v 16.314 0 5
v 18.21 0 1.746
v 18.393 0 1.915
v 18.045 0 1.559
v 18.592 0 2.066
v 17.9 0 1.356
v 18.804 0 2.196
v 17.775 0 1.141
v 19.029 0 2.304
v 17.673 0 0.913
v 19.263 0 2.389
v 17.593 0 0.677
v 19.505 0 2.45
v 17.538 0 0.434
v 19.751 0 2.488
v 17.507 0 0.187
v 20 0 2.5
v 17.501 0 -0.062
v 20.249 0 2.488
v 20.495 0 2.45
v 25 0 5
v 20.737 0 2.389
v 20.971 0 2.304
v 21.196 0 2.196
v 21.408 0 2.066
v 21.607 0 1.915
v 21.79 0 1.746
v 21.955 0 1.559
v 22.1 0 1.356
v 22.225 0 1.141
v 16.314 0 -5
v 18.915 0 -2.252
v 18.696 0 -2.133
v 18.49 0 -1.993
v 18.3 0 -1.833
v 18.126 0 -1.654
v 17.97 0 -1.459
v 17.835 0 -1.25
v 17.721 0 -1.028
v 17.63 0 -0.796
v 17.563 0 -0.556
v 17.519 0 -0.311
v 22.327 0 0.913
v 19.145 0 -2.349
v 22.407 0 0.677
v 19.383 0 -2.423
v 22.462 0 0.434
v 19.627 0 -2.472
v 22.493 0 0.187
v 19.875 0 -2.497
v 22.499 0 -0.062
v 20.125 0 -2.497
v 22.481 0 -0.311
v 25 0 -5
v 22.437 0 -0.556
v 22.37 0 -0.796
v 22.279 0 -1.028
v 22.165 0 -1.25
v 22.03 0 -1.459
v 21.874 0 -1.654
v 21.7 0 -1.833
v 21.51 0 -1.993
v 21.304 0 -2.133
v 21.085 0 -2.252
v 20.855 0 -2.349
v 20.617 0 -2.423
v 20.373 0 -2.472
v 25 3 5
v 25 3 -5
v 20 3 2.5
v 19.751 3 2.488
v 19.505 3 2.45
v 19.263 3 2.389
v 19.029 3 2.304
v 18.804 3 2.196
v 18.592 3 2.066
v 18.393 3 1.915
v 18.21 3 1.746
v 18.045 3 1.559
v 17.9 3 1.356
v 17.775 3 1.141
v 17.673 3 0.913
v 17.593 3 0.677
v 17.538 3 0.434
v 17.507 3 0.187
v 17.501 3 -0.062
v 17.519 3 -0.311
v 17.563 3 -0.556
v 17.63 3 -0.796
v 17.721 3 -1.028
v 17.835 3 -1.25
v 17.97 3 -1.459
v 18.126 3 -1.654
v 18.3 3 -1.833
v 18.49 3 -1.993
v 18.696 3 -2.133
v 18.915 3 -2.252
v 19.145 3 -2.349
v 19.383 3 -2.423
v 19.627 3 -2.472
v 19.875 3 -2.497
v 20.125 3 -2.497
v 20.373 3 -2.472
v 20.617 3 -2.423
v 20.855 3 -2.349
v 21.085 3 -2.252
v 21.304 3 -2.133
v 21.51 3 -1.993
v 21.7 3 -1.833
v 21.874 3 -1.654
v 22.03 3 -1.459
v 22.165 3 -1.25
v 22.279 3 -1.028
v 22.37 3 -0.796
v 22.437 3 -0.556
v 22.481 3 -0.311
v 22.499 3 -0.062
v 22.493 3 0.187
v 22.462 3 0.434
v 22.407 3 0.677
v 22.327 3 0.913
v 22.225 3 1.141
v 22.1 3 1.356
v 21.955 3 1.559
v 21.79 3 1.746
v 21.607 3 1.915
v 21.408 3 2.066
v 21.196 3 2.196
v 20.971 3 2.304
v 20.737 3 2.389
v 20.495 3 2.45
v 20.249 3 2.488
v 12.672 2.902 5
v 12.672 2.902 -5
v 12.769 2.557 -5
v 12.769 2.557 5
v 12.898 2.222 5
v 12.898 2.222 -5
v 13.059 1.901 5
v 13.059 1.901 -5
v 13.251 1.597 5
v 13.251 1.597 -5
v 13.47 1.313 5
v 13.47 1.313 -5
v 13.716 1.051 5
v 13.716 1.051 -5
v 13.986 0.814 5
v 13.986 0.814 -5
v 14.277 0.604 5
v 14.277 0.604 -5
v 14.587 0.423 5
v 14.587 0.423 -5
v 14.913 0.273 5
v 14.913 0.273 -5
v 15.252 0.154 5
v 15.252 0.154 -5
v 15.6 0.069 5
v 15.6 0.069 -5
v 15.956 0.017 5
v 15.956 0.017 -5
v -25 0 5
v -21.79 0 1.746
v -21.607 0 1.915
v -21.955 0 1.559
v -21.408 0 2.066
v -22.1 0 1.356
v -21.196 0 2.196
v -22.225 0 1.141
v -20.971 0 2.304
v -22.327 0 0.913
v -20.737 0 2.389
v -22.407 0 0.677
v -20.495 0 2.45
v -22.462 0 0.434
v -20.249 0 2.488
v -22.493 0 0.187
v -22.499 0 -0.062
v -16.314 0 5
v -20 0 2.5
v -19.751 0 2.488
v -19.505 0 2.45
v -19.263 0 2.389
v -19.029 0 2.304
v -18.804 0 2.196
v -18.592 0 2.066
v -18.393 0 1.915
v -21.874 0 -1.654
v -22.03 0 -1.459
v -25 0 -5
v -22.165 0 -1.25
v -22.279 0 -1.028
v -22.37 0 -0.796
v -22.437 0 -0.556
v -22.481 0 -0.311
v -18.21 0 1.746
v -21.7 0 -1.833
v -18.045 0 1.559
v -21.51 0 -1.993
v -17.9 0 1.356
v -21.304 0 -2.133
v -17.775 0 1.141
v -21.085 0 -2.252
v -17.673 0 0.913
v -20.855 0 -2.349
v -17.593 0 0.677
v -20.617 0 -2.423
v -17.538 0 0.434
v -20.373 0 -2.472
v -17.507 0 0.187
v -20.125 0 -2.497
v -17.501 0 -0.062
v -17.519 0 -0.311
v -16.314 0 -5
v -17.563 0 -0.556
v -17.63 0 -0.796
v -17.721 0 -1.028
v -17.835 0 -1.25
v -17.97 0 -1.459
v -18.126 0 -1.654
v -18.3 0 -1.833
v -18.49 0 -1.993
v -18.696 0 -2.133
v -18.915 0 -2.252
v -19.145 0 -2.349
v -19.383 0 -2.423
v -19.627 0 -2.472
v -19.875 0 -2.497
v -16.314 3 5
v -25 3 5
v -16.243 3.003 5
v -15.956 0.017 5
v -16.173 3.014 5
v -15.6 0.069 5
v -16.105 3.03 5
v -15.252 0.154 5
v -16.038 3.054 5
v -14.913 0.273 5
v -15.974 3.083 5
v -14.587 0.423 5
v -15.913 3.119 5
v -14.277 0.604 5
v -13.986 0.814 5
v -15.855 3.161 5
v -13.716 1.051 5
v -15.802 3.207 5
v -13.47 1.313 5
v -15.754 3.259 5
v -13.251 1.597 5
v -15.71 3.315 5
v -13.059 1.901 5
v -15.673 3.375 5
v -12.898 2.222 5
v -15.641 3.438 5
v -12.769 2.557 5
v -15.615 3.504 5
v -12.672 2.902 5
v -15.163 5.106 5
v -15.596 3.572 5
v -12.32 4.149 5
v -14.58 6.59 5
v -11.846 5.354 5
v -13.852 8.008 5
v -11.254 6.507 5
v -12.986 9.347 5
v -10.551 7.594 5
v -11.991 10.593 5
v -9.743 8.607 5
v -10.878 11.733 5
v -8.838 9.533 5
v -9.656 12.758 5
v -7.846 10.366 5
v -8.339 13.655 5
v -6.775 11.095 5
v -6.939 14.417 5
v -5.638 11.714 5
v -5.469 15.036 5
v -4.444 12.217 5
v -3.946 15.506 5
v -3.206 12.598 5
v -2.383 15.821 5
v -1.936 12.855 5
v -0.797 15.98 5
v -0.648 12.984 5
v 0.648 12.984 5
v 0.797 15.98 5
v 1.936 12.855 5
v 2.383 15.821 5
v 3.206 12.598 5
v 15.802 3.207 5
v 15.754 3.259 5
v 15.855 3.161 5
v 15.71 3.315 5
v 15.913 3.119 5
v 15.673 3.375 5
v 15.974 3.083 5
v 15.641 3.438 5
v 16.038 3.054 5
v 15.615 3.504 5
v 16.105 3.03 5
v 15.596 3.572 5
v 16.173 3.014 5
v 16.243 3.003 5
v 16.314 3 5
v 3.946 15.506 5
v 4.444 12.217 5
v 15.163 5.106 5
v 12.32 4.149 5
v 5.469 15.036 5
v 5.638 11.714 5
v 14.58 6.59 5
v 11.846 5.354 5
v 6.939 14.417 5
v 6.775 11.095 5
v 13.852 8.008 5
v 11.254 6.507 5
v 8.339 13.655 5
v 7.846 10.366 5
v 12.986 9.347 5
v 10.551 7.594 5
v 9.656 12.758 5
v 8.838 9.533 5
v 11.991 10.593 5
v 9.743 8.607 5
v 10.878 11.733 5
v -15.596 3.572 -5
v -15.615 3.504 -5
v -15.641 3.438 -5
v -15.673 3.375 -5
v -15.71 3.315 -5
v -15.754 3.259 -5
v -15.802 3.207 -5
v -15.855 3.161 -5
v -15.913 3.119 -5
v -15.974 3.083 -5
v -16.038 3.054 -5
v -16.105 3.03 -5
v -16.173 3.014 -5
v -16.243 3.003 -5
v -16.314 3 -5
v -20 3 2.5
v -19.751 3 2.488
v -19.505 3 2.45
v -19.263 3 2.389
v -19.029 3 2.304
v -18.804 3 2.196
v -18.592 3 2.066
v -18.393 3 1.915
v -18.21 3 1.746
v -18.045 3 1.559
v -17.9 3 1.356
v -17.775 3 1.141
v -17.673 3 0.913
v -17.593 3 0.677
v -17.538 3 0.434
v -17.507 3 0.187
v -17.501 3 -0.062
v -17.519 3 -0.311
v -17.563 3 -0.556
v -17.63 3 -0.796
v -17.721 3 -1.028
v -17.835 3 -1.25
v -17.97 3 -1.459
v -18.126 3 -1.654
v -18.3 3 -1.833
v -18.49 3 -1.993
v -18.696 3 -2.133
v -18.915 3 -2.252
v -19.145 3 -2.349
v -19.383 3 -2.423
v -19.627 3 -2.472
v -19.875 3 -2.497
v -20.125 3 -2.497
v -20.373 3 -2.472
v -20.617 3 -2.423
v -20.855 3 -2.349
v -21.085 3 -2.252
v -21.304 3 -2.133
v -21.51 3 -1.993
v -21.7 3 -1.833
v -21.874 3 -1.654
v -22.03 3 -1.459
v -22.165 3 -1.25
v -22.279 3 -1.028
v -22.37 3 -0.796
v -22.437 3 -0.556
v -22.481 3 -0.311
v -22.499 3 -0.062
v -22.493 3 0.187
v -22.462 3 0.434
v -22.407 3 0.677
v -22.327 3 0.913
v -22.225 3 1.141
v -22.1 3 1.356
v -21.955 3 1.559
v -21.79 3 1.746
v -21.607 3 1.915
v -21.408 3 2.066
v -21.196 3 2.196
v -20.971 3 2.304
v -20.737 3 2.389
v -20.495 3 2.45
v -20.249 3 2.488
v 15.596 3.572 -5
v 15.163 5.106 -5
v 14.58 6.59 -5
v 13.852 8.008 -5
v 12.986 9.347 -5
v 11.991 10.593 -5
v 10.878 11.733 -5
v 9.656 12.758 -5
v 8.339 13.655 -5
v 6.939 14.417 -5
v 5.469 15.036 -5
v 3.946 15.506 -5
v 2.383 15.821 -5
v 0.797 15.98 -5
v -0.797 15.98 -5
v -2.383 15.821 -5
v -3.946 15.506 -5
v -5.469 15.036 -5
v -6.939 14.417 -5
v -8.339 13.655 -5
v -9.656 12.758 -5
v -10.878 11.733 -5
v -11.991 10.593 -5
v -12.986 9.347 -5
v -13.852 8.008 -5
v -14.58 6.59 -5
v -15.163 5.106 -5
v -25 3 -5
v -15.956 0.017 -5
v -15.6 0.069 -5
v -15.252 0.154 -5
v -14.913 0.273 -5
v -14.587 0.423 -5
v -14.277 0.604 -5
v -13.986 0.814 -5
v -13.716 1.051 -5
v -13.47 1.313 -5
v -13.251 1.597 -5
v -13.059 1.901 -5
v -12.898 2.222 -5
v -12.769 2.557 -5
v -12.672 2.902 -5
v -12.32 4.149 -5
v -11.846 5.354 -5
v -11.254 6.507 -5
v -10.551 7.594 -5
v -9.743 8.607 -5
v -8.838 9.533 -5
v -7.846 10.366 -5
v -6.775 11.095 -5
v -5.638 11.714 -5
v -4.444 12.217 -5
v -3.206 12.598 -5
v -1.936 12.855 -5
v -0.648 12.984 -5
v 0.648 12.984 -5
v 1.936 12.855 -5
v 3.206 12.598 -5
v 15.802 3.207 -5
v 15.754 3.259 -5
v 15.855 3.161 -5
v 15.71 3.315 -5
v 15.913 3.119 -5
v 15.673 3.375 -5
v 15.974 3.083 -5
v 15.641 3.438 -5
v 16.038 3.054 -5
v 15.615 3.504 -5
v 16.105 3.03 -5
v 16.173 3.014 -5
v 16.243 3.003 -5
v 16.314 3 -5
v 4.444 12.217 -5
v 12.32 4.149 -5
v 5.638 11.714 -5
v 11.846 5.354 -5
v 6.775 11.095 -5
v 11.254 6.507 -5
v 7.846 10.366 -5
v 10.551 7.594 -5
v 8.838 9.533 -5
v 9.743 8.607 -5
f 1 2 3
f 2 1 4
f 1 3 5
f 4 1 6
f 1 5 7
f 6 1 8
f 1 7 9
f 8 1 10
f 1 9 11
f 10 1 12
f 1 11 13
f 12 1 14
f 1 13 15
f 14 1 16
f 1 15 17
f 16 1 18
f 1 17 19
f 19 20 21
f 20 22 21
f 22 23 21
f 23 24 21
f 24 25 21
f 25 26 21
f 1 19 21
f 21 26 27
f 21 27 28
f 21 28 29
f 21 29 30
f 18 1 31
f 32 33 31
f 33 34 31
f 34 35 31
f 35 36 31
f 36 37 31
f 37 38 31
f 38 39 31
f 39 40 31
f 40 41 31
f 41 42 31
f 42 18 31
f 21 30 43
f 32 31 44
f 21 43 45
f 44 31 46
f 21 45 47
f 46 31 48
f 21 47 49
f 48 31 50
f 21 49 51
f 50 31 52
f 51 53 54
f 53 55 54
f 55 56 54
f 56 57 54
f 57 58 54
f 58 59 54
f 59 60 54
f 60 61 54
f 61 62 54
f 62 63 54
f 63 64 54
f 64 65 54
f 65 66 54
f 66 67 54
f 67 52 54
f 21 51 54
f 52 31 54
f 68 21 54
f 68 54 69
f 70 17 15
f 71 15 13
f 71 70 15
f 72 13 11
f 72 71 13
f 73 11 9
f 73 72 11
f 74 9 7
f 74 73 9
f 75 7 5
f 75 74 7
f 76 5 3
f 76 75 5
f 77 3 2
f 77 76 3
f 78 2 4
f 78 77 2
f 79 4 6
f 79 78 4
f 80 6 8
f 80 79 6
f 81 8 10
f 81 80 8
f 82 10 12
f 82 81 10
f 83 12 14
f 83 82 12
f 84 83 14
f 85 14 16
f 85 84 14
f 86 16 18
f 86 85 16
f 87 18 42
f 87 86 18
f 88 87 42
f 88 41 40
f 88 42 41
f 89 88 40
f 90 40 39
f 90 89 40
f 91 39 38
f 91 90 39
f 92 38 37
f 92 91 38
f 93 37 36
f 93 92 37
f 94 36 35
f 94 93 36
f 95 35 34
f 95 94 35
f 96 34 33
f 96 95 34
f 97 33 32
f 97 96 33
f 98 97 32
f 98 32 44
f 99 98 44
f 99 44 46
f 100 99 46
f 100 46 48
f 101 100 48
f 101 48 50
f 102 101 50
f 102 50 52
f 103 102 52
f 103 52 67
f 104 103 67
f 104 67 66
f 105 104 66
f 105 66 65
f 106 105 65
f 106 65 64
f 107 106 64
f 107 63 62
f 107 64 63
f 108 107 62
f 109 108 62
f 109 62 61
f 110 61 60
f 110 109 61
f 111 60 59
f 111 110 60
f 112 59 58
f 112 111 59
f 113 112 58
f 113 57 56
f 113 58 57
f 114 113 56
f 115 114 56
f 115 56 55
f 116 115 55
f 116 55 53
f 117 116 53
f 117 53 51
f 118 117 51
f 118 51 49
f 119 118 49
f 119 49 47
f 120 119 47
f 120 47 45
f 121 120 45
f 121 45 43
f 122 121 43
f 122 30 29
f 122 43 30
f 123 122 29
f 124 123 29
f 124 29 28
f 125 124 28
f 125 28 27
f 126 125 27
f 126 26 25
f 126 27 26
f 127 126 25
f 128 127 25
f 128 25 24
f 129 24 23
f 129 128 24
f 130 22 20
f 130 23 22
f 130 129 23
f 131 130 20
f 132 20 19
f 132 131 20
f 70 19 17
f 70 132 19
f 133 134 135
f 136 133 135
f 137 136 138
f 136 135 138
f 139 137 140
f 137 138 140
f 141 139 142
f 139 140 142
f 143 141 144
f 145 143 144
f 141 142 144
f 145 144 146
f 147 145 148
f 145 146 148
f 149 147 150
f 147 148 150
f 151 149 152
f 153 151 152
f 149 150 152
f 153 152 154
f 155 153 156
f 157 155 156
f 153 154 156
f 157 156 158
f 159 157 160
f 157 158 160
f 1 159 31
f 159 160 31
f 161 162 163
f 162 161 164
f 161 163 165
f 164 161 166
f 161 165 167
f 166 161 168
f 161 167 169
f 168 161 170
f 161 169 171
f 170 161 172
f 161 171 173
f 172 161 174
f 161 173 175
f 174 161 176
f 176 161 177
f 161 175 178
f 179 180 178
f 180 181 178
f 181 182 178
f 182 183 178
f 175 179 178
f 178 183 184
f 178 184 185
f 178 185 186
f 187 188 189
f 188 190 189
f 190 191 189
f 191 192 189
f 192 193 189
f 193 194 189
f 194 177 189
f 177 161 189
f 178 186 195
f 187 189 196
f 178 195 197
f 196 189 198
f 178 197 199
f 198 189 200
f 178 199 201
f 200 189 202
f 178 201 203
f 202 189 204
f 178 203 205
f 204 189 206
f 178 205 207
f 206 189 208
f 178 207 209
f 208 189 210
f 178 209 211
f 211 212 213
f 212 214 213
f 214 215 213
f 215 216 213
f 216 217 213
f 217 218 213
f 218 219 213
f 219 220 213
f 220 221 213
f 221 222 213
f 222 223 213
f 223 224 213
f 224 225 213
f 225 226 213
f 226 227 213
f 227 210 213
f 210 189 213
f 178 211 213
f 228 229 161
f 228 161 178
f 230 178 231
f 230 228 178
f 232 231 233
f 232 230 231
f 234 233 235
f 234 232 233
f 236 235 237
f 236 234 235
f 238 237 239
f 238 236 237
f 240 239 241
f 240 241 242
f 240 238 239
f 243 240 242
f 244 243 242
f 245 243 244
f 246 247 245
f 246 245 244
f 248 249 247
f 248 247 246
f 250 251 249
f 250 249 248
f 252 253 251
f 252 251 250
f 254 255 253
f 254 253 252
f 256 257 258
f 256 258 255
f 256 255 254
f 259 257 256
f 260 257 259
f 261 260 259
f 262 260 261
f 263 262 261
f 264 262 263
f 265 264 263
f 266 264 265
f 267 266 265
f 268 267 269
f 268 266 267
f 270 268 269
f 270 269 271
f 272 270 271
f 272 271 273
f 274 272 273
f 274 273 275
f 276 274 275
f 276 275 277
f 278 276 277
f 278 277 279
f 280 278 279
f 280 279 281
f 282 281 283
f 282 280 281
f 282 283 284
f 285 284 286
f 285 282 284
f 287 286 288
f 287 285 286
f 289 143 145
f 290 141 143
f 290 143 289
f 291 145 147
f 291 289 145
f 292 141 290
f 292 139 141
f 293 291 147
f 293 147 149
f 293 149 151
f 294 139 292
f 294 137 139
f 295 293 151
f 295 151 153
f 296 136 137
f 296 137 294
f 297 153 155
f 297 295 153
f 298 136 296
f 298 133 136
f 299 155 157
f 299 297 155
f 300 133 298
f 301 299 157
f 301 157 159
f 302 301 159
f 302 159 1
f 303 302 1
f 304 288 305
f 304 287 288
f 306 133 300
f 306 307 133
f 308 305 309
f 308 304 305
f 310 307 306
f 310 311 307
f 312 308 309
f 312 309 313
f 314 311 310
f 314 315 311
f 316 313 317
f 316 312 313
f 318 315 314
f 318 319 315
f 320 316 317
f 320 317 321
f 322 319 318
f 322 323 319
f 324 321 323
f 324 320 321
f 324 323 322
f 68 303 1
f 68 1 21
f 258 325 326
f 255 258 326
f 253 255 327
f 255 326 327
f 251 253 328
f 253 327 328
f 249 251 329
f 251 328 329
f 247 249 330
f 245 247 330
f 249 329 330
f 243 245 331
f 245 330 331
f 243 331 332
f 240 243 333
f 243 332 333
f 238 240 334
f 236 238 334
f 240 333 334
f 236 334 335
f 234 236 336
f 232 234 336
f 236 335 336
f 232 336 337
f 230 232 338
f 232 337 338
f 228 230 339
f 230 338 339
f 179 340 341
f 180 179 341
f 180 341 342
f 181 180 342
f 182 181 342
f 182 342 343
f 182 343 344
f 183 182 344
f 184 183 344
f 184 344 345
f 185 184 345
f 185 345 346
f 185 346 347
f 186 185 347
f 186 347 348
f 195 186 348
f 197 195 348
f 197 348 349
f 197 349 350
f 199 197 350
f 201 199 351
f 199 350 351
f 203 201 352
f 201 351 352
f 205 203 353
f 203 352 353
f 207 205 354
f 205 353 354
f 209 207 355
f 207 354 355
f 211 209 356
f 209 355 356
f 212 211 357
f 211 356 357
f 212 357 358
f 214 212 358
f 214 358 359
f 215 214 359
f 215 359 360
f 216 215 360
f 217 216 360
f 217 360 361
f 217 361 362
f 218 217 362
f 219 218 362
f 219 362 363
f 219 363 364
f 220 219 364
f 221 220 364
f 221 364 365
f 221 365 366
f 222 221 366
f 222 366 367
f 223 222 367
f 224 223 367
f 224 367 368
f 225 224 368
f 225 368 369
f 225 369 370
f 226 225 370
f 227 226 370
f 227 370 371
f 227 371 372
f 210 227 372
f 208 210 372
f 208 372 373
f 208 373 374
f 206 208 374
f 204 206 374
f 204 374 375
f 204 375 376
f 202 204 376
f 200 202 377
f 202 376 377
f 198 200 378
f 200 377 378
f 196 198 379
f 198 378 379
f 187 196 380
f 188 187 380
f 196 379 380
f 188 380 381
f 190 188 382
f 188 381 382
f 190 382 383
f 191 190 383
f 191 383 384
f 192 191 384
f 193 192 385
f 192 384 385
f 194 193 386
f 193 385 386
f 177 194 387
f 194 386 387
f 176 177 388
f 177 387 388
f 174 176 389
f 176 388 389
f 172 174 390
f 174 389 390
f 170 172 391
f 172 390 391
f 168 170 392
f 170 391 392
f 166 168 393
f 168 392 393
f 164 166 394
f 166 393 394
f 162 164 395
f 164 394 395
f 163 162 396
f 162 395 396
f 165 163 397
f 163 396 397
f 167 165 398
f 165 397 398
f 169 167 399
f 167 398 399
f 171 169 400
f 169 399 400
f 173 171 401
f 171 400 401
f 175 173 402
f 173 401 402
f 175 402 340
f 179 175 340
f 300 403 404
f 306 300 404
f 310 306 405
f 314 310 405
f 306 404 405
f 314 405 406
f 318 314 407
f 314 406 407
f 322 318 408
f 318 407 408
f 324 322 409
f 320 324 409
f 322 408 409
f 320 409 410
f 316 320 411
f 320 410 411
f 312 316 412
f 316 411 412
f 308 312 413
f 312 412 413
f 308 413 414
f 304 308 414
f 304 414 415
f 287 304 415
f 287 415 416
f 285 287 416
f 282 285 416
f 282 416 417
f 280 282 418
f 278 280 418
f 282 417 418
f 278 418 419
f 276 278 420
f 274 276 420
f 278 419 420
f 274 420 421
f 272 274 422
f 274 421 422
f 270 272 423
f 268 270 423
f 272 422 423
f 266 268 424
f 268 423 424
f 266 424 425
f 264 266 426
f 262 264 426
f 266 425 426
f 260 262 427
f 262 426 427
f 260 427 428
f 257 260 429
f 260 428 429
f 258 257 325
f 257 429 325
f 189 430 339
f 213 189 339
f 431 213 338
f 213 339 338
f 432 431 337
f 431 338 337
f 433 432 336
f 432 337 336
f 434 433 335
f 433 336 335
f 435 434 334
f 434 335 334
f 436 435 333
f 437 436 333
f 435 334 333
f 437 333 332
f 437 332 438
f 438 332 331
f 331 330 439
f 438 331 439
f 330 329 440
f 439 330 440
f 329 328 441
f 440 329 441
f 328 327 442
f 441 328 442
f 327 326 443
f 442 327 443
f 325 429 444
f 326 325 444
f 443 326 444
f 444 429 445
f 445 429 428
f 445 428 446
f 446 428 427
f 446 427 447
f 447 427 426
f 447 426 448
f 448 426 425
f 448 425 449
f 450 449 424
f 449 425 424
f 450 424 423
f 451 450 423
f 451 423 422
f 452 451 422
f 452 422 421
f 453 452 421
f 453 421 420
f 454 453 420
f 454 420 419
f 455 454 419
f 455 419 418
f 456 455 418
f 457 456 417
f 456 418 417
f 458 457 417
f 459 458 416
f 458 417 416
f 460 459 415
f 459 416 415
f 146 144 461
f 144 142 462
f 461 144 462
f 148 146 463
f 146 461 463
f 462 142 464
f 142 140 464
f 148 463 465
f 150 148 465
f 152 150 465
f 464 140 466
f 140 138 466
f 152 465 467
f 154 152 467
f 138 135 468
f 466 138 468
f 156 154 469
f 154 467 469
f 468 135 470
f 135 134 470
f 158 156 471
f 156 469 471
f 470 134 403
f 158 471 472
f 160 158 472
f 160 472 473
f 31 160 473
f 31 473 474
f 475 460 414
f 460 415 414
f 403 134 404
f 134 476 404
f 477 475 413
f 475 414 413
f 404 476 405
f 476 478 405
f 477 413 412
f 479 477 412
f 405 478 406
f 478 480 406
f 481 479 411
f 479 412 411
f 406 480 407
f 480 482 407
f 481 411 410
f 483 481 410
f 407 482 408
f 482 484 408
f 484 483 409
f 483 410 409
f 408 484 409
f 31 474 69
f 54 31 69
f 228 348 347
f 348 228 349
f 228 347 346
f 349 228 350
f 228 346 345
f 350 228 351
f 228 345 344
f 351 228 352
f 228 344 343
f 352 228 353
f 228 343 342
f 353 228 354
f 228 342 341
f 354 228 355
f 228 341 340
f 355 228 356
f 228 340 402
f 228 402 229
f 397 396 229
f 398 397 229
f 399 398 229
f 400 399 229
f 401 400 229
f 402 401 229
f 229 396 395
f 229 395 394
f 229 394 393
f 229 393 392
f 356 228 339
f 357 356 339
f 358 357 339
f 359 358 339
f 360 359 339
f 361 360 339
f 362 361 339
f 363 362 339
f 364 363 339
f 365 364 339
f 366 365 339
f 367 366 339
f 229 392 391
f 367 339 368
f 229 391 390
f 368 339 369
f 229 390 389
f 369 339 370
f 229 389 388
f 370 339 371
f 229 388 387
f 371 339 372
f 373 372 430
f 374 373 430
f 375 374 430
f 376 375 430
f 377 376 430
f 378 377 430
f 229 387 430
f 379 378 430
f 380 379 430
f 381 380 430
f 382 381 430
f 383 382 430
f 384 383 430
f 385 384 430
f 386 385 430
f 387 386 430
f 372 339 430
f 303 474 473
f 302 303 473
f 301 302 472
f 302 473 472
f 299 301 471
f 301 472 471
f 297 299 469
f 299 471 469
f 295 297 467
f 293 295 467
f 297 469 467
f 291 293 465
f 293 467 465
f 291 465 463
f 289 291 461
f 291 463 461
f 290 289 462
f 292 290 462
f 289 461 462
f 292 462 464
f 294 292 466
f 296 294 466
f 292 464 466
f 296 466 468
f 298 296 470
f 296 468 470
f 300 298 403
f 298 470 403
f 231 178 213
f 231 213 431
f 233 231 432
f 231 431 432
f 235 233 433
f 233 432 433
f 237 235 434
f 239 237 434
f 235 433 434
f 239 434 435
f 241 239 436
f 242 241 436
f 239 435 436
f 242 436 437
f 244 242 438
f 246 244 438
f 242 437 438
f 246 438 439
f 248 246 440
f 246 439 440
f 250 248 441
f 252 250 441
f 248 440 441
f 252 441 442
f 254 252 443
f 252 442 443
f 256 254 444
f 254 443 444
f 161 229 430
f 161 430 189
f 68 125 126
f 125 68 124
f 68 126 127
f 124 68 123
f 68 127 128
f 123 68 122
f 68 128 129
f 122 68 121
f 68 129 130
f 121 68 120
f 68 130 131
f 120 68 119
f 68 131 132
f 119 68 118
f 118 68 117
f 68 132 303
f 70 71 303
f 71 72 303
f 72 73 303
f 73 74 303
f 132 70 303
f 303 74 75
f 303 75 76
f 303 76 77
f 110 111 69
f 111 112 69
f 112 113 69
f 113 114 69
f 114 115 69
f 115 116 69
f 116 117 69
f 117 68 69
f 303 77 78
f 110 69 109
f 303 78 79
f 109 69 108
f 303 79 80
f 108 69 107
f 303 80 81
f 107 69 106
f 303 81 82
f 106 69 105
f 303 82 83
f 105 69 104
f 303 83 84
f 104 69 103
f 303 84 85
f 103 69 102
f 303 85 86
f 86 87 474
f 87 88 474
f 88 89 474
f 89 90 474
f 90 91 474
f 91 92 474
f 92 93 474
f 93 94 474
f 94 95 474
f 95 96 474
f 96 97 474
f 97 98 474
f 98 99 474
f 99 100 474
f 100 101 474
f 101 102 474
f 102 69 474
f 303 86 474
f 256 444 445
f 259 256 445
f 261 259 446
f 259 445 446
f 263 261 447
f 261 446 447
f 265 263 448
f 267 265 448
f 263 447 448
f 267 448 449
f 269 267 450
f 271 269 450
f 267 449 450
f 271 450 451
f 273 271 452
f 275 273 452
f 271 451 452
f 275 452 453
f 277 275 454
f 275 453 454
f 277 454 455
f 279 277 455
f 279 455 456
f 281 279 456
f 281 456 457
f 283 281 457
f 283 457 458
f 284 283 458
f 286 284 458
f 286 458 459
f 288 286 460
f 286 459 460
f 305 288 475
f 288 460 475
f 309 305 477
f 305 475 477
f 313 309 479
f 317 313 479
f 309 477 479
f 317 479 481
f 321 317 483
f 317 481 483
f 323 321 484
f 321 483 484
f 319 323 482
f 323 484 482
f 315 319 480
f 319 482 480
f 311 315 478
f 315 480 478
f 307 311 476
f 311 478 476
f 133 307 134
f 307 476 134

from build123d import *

# Parameters (mm, degrees)
BASE_FLANGE1_START = -5
BASE_FLANGE1_DEPTH = 10
SKETCH6_R          = 2.5
CUT_EXTRUDE1_DEPTH = 10


# Read off the part's stored shape, not the designer's step: Base-Flange1
with BuildPart() as part:
    # Base-Flange1 outline → Base-Flange1 (new body)
    with BuildSketch(Plane.XY.offset(BASE_FLANGE1_START)):
        with BuildLine():
            Line((-16.314153364, 3), (-25, 3))
            Line((-25, 3), (-25, 0))
            Line((-25, 0), (-16.314153364, 0))
            ThreePointArc((-16.314153364, 0), (-13.985527754, 0.814326513), (-12.671868464, 2.902369657))
            ThreePointArc((-12.671868464, 2.902369657), (0, 13), (12.671868464, 2.902369657))
            ThreePointArc((12.671868464, 2.902369657), (13.985527754, 0.814326513), (16.314153364, 0))
            Line((16.314153364, 0), (25, 0))
            Line((25, 0), (25, 3))
            Line((25, 3), (16.314153364, 3))
            ThreePointArc((16.314153364, 3), (15.855108879, 3.160529066), (15.596145802, 3.57214727))
            ThreePointArc((15.596145802, 3.57214727), (0, 16), (-15.596145802, 3.57214727))
            ThreePointArc((-15.596145802, 3.57214727), (-15.855108879, 3.160529066), (-16.314153364, 3))
        make_face()
    extrude(amount=BASE_FLANGE1_DEPTH)

    # Sketch6 → Cut-Extrude1 (cut)
    with BuildSketch(Plane(origin=(0, 3, 0), x_dir=(1, 0, 0), z_dir=(0, 1, 0))):
        with Locations(Location((-20, 0, 0), (0, 0, 270))):
            Circle(SKETCH6_R)
    cut_extrude1 = extrude(amount=-CUT_EXTRUDE1_DEPTH, mode=Mode.SUBTRACT)

    # Mirror1: Cut-Extrude1 across plane
    add(cut_extrude1.mirror(Plane(origin=(0, 0, 0), x_dir=(0, 0, 1), z_dir=(1, 0, 0))), mode=Mode.SUBTRACT)


solid = part.part
